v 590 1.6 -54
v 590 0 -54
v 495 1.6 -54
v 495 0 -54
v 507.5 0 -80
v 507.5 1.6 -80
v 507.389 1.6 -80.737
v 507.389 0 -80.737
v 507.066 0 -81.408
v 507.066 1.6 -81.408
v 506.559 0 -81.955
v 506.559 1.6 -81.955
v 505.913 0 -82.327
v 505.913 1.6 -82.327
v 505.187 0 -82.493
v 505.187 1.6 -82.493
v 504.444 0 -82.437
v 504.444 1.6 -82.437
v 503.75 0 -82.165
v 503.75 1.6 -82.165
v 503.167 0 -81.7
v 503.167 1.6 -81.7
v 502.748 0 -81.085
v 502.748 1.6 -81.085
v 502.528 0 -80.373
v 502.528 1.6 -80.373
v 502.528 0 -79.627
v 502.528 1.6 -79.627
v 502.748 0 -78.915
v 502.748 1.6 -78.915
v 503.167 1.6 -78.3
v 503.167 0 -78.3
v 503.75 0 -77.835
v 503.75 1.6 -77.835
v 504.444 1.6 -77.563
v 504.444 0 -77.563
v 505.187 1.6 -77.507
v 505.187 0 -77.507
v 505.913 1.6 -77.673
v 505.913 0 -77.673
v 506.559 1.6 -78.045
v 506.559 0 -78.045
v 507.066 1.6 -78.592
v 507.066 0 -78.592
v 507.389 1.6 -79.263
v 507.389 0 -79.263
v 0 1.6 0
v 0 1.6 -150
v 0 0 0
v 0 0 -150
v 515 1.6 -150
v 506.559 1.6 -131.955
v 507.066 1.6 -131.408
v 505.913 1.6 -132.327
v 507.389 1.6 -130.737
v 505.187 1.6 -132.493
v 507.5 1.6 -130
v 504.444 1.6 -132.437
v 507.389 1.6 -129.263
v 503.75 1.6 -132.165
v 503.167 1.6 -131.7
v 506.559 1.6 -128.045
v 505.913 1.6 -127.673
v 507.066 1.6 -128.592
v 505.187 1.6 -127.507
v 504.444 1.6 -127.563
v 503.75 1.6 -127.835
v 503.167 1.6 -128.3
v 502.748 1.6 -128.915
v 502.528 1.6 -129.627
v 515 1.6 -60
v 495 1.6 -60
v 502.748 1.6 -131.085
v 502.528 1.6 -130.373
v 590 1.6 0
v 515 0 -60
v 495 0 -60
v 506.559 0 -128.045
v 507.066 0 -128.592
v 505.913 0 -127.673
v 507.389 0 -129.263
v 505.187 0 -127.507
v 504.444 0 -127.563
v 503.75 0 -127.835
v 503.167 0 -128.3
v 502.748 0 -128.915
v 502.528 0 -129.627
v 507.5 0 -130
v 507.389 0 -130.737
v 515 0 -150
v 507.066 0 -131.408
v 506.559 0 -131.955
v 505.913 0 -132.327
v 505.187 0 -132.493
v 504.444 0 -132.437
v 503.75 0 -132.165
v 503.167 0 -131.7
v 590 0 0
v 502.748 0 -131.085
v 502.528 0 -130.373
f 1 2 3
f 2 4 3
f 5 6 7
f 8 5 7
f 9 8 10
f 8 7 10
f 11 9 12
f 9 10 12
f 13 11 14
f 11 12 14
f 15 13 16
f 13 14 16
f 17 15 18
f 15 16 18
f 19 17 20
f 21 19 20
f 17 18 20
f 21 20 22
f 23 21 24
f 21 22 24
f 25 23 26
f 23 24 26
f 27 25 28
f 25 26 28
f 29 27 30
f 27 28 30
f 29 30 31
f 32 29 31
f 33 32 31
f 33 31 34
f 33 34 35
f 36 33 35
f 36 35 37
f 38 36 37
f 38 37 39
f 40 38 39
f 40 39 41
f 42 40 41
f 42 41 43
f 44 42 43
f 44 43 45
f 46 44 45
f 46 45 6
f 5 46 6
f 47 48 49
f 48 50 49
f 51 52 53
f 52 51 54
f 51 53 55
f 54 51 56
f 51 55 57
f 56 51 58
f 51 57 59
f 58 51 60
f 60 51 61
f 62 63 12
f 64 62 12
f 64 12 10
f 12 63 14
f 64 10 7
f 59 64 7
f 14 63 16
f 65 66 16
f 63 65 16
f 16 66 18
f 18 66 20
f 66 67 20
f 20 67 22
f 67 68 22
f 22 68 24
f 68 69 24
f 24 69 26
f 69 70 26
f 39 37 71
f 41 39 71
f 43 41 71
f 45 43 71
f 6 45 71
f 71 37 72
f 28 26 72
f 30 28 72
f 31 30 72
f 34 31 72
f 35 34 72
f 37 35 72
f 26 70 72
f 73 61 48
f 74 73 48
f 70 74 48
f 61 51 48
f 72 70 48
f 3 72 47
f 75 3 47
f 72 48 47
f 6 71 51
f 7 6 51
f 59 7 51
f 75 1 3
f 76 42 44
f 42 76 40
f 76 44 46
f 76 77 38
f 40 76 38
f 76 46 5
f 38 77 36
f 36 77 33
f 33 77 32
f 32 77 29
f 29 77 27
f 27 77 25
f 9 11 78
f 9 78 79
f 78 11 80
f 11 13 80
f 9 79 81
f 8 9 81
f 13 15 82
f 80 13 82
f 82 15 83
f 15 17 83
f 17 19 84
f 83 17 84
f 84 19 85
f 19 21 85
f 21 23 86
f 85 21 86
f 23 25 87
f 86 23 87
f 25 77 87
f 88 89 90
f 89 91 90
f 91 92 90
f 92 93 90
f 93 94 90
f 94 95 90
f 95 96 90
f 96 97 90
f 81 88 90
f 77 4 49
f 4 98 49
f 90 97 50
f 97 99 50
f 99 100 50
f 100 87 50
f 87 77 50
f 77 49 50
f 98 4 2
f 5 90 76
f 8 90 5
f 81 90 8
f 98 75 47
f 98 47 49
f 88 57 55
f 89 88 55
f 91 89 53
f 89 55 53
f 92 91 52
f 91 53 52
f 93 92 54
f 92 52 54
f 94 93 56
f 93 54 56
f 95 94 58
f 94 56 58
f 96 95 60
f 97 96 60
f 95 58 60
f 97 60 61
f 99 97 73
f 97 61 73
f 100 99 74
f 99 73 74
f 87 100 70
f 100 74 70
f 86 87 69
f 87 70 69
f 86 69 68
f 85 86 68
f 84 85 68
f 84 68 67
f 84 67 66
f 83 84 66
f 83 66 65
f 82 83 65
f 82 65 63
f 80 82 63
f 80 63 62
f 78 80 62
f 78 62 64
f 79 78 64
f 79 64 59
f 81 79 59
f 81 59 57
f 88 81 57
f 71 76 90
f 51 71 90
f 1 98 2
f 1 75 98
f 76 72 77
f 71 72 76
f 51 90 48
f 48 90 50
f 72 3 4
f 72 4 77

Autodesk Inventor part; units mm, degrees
ref_plane "YZ Plane" through (0, 0, 0) normal (1, 0, 0) x (0, 1, 0)
ref_plane "XZ Plane" through (0, 0, 0) normal (0, 1, 0) x (-1, 0, 0)
ref_plane "XY Plane" through (0, 0, 0) normal (0, 0, 1) x (1, 0, 0)
sketch "Sketch1" plane through (0, 0, 0) normal (0, 1, 0) x (-1, 0, 0)
  line L0 (0, 0) -> (-515, 0)
  line L1 (-515, 0) -> (-515, -150)
  line L2 (-515, -150) -> (0, -150)
  line L3 (0, -150) -> (0, 0)
  dimension "d0" = 515
  dimension "d1" = 150
extrude "Extrusion1" add sketch "Sketch1" along normal blind 1.6
sketch "Sketch2" plane through (0, 1.6, 0) normal (0, 1, 0) x (1, 0, 0)
  line L0 (515, 0) -> (495, 0)
  line L1 (495, 0) -> (495, 60)
  line L2 (495, 60) -> (515, 60)
  line L3 (515, 60) -> (515, 0)
  circle A0 centre (505, 80) radius 2.5
  circle A1 centre (505, 130) radius 2.5
  line L4 (515, 150) -> (0, 150) projected
  point P0 (0, 0)
  point P1 (505, 60)
  dimension "d6" = 20
  dimension "d7" = 60
  dimension "d10" = 5
  dimension "d11" = 5
  dimension "d12" = 50
  dimension "d13" = 20
extrude "Extrusion3" cut sketch "Sketch2" against normal blind 1.6
sketch "Sketch3" plane through (495, 1.6, 0) normal (1, 0, 0) x (0, 0, -1)
  line L0 (0, -1.6) -> (54, -1.6)
  line L1 (54, -1.6) -> (54, 0)
  line L2 (54, 0) -> (0, 0)
  line L3 (0, 0) -> (0, -1.6)
  dimension "d16" = 54
  dimension "d17" = 1.6
extrude "Extrusion4" add sketch "Sketch3" along normal blind 95
properties part number "X-Axis Panel Right" material "Steel"
